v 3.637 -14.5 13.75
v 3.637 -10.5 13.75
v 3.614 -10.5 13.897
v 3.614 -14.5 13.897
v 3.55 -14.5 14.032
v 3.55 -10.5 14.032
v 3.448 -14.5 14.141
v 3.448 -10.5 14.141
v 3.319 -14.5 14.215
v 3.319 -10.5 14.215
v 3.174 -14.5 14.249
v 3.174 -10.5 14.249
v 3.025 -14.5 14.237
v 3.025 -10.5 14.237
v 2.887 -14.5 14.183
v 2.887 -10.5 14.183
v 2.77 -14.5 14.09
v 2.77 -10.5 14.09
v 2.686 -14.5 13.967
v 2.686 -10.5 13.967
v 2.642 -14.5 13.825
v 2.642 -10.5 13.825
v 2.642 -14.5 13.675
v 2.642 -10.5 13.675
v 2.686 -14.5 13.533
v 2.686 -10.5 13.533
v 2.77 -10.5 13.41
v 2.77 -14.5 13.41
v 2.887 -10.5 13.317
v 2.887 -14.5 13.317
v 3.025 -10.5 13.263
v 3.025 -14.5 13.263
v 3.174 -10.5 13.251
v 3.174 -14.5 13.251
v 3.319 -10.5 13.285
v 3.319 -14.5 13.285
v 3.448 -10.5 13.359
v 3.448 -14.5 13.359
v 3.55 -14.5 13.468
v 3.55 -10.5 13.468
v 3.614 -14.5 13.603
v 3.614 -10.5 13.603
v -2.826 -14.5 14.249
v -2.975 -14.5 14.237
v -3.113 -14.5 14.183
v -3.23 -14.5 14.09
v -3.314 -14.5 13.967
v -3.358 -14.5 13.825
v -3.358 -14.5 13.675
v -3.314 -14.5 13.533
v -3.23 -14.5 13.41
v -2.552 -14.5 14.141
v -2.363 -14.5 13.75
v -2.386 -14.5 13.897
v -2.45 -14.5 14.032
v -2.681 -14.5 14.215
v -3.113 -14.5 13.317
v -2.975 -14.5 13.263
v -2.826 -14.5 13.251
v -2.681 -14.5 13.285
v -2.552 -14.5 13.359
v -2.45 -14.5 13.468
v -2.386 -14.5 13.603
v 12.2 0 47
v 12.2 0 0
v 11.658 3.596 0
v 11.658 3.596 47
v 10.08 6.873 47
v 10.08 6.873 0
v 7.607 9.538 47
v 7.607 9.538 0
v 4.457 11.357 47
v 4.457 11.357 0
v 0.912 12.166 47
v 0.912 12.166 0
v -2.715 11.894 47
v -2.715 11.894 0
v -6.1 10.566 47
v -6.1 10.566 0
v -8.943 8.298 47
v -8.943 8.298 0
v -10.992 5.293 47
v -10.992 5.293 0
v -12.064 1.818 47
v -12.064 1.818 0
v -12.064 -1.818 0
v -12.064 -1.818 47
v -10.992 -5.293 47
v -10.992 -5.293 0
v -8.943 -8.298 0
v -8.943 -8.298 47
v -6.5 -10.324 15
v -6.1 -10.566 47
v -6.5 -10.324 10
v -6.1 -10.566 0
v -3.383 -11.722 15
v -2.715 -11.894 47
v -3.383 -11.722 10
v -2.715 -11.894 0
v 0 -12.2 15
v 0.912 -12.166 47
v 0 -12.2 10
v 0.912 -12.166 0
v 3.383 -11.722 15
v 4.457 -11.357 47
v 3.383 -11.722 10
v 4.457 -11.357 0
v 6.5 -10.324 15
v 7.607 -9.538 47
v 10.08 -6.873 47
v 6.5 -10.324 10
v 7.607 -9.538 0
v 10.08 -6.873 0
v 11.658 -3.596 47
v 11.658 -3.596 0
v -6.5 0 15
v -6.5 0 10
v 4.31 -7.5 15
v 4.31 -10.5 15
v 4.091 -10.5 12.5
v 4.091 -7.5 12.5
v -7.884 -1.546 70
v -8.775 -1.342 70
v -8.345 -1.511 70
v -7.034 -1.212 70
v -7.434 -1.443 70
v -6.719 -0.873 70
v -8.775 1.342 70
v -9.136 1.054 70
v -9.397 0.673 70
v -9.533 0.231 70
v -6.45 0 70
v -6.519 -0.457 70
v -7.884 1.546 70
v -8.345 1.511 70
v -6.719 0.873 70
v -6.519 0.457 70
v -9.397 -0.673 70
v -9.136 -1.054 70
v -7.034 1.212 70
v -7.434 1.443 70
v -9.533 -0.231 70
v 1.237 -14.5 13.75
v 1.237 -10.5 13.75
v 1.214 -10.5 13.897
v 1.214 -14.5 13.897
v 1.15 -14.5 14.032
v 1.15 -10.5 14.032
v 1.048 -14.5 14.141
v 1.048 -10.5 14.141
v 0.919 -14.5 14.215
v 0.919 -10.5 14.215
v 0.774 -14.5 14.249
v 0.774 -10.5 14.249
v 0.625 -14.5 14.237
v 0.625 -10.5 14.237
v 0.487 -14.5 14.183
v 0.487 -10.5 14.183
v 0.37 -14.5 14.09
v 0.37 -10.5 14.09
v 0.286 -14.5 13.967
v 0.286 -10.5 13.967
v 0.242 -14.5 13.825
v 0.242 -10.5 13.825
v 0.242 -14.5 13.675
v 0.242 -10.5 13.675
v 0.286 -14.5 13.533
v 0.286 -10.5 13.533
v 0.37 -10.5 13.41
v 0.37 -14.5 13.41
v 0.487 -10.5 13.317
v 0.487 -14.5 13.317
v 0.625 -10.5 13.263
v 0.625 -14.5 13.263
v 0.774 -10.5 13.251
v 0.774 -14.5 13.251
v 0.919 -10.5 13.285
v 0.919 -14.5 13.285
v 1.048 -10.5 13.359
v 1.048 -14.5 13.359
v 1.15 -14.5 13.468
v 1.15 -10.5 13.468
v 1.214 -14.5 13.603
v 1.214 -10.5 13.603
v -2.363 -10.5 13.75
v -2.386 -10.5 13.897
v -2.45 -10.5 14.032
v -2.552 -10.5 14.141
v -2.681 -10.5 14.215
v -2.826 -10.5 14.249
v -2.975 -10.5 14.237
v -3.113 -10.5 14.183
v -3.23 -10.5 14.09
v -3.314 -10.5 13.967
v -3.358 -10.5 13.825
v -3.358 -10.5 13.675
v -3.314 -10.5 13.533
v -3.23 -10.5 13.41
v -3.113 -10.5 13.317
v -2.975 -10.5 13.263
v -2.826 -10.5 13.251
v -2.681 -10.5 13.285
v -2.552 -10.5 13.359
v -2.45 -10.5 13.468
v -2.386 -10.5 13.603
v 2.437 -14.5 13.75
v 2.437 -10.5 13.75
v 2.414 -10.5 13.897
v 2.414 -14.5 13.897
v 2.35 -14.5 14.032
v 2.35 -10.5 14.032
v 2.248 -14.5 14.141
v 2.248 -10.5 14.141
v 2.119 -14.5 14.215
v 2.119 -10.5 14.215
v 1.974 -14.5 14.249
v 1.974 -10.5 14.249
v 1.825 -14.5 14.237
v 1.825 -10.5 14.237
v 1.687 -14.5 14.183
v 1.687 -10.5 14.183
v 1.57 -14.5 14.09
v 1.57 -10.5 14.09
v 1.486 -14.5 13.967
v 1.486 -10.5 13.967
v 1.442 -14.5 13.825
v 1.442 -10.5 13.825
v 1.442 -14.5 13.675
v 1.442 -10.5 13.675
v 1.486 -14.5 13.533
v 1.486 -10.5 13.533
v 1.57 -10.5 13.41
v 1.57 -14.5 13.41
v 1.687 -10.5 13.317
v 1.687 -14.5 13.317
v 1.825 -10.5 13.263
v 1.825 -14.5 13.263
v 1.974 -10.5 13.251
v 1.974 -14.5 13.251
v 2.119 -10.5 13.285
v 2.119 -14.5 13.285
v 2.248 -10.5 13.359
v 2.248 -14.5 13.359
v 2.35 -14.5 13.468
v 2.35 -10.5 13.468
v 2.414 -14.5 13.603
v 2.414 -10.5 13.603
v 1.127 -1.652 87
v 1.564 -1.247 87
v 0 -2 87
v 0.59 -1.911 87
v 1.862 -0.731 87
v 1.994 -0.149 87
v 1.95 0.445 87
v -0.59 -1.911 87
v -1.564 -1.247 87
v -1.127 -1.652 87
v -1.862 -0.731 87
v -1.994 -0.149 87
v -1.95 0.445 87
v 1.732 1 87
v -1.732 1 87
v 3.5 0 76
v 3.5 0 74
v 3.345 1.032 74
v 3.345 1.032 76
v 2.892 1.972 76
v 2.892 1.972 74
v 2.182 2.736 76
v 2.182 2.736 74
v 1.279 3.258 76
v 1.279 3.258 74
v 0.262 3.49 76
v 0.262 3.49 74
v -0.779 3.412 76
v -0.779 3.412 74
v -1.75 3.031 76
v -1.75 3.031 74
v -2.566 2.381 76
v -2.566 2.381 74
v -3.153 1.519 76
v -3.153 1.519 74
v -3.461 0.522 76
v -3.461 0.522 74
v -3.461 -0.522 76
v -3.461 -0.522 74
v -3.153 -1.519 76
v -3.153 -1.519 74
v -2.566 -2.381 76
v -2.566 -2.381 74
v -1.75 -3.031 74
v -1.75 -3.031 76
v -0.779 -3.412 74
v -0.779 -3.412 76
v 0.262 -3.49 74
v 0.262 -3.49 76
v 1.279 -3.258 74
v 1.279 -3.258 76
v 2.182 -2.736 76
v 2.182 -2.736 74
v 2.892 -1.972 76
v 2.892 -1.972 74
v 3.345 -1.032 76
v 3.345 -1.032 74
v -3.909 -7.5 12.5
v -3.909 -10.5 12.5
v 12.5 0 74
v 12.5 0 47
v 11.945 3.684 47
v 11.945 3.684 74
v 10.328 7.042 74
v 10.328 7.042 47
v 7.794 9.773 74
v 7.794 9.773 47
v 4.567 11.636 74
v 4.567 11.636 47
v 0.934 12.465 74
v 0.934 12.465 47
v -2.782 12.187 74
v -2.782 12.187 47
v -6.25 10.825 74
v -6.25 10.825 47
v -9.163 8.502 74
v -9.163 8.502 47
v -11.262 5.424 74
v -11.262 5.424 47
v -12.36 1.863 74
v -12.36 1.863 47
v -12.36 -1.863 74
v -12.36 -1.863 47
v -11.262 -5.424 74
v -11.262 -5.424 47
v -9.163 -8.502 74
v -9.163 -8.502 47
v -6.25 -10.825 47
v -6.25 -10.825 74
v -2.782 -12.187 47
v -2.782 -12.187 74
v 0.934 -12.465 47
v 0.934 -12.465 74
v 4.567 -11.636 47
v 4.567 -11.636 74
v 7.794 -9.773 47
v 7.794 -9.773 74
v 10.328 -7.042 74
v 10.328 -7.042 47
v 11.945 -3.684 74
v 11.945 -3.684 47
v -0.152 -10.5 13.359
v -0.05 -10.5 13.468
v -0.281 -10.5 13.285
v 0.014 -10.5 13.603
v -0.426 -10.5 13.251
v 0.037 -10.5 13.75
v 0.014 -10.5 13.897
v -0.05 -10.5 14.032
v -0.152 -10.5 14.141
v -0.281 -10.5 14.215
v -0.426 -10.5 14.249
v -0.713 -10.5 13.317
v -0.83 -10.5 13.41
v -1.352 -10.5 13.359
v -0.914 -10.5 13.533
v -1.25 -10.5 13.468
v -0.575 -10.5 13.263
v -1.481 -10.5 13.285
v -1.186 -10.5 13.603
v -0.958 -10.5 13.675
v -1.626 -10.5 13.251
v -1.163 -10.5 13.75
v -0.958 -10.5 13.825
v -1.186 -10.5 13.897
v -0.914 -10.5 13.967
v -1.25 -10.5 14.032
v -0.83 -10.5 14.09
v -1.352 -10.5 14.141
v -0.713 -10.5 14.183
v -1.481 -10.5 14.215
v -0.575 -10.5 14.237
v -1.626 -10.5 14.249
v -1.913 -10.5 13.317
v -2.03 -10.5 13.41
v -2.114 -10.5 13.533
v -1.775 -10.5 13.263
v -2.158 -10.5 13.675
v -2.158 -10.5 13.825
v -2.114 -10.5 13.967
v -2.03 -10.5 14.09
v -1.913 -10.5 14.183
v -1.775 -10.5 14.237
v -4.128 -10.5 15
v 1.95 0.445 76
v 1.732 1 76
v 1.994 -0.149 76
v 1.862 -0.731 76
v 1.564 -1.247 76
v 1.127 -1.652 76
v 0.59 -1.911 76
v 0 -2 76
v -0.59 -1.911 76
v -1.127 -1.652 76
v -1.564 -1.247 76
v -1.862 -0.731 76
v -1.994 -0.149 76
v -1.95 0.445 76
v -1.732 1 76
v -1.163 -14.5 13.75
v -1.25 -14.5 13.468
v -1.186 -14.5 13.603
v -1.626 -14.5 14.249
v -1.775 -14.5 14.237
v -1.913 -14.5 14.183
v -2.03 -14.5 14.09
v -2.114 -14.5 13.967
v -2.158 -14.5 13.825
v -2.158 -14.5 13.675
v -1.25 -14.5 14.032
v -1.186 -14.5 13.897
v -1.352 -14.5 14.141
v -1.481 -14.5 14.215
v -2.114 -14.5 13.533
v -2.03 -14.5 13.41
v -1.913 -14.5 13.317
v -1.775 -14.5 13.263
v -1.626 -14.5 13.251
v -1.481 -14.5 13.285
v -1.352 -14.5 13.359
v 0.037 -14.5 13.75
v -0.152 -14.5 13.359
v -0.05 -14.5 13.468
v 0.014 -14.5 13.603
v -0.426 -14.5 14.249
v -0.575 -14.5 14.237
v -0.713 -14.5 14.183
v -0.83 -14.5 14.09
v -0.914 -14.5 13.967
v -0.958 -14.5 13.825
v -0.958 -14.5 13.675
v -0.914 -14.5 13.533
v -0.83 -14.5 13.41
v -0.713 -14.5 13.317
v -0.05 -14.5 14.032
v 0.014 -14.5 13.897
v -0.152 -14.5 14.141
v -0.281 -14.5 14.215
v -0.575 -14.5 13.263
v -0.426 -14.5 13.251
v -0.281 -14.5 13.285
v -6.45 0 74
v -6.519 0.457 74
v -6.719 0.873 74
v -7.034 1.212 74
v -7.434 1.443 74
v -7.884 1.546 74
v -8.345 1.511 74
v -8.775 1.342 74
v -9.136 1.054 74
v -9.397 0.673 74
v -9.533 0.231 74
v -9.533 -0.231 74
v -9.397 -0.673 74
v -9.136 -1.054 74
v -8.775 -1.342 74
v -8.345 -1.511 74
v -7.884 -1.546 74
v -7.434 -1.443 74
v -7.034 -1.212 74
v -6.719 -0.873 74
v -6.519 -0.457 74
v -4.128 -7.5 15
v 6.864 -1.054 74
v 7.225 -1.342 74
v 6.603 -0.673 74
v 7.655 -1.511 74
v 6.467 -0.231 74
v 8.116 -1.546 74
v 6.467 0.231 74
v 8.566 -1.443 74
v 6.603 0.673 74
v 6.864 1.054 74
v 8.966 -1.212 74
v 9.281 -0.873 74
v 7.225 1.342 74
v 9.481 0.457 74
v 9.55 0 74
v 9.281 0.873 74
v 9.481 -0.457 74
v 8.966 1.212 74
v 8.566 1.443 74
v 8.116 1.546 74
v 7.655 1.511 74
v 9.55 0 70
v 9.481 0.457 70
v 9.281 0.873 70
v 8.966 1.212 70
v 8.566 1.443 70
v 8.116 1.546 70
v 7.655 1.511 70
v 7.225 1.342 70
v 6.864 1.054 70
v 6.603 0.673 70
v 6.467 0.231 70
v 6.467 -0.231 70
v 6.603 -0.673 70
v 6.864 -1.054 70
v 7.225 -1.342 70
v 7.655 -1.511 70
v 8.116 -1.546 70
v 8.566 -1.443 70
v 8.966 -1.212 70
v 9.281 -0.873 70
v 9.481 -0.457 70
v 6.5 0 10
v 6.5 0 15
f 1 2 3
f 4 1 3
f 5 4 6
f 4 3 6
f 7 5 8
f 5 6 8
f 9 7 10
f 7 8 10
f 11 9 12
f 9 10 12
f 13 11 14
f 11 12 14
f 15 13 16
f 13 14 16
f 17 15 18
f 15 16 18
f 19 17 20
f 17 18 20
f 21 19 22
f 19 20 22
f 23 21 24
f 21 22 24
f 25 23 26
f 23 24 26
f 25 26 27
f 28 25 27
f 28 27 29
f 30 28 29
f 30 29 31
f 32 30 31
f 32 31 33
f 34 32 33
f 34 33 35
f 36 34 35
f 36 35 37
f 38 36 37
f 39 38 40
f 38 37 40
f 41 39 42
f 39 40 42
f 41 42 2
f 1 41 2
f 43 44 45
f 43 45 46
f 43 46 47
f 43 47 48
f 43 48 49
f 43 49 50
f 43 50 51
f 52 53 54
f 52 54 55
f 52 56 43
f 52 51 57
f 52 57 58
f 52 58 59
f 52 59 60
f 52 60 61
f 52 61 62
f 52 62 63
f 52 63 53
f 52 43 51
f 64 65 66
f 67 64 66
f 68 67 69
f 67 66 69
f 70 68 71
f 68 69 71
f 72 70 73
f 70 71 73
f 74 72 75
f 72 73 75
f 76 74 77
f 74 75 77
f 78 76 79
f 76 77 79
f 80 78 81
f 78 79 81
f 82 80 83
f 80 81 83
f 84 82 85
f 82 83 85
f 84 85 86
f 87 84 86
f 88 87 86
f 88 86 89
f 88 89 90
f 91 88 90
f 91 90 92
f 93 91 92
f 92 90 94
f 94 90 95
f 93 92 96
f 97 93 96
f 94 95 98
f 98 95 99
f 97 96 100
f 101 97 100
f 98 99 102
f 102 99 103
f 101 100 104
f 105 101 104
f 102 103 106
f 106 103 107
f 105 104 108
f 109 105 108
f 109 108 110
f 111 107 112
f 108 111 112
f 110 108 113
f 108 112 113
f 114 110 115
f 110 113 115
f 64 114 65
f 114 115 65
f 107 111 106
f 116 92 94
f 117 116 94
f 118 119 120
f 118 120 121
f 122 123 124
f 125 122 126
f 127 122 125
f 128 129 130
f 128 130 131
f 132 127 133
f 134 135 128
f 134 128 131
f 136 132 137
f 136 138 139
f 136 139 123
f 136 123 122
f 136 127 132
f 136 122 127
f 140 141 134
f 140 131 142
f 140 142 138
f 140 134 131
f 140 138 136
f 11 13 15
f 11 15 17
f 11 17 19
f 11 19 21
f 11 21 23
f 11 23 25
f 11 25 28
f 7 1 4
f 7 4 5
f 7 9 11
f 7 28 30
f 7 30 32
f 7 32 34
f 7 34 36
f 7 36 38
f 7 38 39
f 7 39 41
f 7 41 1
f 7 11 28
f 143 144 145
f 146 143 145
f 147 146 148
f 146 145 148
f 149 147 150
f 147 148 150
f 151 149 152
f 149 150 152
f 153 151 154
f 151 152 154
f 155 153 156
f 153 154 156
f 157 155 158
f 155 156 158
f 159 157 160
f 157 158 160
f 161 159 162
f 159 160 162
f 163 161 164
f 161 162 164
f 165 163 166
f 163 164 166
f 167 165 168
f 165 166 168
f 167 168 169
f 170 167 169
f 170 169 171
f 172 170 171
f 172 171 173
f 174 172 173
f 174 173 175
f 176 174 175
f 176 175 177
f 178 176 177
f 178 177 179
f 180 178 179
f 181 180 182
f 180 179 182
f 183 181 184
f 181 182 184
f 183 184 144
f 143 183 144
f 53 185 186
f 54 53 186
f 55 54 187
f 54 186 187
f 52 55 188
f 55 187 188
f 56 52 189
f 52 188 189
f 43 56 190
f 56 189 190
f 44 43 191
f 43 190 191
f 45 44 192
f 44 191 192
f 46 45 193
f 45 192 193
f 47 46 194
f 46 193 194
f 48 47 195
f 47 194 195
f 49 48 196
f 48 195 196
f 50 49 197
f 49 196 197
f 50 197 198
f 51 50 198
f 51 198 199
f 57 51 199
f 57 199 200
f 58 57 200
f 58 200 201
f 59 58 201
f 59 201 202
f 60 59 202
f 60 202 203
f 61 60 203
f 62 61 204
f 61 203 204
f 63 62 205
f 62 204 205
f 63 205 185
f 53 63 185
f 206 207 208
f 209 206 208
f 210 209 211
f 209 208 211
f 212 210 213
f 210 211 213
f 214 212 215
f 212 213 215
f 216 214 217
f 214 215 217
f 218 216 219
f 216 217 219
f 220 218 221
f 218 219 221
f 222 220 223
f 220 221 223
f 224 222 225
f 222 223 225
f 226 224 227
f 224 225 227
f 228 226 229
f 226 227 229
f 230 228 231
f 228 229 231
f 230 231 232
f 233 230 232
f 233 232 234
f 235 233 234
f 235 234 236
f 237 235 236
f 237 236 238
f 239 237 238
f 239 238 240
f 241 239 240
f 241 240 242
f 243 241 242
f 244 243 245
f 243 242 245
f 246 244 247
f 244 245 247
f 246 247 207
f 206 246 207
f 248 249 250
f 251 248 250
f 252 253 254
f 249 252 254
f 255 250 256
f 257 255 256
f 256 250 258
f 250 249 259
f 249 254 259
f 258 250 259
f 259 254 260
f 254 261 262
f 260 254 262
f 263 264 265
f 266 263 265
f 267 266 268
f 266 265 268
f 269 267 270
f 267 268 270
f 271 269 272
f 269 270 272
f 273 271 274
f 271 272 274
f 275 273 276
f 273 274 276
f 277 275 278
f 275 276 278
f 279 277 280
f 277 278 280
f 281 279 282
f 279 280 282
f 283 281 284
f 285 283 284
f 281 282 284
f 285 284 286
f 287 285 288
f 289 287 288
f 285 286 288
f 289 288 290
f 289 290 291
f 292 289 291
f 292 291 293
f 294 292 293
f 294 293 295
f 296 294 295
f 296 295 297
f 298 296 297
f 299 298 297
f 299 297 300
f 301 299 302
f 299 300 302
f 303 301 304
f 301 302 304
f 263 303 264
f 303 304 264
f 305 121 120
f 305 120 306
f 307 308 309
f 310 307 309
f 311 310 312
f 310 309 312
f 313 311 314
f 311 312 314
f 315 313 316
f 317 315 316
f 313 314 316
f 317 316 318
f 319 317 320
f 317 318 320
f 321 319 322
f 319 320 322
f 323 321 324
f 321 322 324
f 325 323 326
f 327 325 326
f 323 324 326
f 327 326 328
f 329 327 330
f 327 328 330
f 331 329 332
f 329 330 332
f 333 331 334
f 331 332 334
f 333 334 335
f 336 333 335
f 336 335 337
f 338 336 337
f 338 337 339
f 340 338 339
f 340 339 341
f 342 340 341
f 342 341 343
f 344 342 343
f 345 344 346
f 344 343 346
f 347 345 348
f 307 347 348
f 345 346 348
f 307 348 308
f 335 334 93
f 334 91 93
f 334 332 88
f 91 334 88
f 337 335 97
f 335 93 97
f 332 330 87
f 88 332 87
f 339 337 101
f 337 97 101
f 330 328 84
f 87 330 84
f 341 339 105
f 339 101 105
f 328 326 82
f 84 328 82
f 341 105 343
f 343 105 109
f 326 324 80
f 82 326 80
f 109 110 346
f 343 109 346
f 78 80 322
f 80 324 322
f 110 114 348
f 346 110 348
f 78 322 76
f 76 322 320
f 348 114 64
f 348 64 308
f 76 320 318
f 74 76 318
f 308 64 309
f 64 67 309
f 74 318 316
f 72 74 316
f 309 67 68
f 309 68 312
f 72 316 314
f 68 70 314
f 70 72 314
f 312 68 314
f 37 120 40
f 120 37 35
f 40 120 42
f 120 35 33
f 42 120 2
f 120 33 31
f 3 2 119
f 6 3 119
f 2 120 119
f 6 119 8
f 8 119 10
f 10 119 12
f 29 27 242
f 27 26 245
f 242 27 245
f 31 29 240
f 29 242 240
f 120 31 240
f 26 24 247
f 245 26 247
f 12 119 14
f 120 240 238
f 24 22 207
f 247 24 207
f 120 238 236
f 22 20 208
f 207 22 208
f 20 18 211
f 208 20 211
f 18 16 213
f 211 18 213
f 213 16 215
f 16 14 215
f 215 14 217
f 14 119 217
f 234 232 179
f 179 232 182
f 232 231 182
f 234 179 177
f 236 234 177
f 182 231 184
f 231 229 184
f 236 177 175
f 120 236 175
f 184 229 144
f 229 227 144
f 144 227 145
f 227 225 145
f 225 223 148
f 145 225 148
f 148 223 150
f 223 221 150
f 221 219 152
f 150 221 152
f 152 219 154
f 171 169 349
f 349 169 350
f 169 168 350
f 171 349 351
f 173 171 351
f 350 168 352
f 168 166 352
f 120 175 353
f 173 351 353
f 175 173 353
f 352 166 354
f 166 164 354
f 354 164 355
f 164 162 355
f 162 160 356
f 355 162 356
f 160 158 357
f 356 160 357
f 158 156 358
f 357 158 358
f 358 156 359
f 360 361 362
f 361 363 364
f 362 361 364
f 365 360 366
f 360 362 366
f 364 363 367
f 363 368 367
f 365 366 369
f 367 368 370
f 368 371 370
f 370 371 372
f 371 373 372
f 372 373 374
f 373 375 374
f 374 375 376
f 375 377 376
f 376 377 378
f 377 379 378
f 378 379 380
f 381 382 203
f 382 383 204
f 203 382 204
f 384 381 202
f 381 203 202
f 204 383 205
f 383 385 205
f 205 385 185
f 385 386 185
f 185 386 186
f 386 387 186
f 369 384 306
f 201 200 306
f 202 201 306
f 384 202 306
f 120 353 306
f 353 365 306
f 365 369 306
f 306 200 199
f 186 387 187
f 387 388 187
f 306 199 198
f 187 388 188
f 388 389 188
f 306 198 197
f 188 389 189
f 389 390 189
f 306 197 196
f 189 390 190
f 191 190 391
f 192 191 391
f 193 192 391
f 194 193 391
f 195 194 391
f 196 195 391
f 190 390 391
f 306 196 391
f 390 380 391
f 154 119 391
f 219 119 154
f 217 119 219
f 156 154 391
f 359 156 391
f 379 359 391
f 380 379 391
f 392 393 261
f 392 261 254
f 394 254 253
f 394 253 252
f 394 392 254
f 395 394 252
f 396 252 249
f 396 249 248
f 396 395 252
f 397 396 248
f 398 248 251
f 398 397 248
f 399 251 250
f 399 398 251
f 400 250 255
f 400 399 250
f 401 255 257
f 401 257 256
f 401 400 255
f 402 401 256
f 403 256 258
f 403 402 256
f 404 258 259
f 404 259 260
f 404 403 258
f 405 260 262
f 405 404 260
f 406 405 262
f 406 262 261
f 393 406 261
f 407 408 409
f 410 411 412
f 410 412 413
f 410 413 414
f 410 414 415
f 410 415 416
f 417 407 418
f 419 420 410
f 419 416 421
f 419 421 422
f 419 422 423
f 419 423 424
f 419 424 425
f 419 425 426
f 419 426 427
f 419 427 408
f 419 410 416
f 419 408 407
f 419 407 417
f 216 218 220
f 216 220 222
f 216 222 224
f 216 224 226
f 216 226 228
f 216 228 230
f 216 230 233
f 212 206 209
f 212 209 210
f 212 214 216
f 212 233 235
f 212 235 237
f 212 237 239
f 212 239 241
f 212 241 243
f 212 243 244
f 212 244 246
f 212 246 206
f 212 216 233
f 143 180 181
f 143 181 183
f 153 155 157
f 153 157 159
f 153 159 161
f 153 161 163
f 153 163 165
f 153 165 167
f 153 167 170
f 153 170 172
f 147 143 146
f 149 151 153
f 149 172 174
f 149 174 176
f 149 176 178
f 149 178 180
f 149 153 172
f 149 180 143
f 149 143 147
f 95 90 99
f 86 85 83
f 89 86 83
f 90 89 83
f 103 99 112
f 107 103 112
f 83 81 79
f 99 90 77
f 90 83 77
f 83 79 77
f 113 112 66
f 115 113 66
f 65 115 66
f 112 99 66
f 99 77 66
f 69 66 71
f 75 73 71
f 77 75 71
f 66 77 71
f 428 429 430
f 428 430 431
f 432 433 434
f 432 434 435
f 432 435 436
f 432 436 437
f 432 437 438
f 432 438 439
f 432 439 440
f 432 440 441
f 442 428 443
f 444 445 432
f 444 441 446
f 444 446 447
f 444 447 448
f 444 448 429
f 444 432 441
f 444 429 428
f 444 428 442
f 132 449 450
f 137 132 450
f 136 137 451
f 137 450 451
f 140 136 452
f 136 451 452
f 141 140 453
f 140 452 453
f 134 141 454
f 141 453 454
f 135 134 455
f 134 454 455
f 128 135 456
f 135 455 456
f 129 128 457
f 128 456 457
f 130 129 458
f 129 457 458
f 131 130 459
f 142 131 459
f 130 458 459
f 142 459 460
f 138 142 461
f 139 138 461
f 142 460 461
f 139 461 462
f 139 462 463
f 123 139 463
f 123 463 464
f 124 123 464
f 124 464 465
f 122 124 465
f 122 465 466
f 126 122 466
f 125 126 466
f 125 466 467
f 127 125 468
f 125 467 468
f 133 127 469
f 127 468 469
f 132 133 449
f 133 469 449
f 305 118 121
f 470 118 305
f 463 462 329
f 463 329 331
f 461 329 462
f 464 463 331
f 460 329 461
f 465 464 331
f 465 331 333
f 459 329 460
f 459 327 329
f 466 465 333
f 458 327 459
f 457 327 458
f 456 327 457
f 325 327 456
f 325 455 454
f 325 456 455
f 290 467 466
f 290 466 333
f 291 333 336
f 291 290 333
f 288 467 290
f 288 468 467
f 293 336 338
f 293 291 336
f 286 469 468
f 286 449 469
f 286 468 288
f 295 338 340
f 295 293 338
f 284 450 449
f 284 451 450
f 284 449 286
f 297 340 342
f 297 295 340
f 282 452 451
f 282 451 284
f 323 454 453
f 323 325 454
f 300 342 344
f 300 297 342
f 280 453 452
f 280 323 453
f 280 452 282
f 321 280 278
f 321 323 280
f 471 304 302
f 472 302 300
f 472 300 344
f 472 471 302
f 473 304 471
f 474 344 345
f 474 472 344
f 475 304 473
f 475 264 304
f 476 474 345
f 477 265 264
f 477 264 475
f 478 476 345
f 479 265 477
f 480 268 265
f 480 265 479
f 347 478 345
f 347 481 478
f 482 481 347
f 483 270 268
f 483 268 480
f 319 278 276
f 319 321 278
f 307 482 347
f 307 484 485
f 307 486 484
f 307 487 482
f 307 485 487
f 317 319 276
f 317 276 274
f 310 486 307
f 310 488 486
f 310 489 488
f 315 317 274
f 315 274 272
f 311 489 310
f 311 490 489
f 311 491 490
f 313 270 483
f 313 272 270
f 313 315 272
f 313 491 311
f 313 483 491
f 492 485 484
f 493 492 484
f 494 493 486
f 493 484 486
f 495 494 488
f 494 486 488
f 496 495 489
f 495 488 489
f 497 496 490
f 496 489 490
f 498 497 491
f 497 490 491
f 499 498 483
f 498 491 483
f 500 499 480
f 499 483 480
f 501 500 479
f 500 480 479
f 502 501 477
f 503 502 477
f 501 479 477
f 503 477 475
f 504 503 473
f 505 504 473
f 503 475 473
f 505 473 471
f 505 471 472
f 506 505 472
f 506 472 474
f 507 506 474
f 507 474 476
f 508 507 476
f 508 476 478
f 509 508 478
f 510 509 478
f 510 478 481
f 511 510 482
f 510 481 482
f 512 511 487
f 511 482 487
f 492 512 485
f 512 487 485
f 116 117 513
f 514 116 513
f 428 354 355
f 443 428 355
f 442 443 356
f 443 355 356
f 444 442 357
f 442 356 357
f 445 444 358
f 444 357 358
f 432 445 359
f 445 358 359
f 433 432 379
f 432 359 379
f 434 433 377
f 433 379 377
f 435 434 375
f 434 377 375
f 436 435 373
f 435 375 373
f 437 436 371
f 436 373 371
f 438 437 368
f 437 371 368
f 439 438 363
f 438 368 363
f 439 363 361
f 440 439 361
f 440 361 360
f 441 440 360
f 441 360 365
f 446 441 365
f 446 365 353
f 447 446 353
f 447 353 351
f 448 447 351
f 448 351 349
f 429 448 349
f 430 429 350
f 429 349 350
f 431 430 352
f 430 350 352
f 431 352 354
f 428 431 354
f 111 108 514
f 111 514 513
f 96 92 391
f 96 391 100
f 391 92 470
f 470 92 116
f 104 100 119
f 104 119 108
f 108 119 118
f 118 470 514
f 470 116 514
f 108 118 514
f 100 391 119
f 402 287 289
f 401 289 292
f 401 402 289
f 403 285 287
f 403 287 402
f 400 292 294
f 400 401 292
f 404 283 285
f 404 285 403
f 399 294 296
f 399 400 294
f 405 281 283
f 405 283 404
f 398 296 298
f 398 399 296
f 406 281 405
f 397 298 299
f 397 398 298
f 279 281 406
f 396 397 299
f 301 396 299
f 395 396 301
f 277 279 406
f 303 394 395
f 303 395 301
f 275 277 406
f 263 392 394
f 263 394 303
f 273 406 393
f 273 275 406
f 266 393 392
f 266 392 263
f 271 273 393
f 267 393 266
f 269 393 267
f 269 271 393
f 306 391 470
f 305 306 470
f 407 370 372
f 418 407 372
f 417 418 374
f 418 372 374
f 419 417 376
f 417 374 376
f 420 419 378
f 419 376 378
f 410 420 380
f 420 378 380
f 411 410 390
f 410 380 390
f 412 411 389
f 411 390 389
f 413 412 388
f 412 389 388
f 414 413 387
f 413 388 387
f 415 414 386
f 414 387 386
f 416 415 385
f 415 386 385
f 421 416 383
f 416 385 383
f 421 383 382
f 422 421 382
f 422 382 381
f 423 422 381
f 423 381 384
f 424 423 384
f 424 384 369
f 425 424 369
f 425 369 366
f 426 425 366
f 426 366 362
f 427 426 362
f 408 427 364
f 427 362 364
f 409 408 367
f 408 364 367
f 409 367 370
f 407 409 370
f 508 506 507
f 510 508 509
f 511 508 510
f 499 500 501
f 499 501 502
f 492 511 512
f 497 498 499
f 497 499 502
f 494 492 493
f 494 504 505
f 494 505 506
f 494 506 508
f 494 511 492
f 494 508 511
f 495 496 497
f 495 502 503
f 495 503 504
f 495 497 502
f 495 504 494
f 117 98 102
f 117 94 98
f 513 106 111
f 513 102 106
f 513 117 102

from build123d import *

# Parameters (mm, degrees)
SKETCH1_R           = 12.2
BOSS_EXTRUDE1_DEPTH = 47
SKETCH2_R           = 12.5
BOSS_EXTRUDE2_DEPTH = 27
SKETCH3_R           = 3.5
BOSS_EXTRUDE3_DEPTH = 2
BOSS_EXTRUDE4_DEPTH = 11
SKETCH6_W           = 13
SKETCH6_H           = 5
CUT_EXTRUDE1_DEPTH  = 15
SKETCH7_W           = 8
SKETCH7_H           = 3
BOSS_EXTRUDE6_DEPTH = 2.5
SKETCH8_R           = 0.5
BOSS_EXTRUDE7_DEPTH = 4
DRAFT1_ANGLE        = 5
SKETCH9_R           = 1.55
CUT_EXTRUDE2_DEPTH  = 4


with BuildPart() as part:
    # Sketch1 → Boss-Extrude1 (new body)
    with BuildSketch(Plane.XY):
        Circle(SKETCH1_R)
    extrude(amount=BOSS_EXTRUDE1_DEPTH)

    # Sketch2 → Boss-Extrude2 (add)
    with BuildSketch(Plane.XY.offset(47)):
        Circle(SKETCH2_R)
    extrude(amount=BOSS_EXTRUDE2_DEPTH)

    # Sketch3 → Boss-Extrude3 (add)
    with BuildSketch(Plane.XY.offset(74)):
        Circle(SKETCH3_R)
    extrude(amount=BOSS_EXTRUDE3_DEPTH)

    # Sketch4 → Boss-Extrude4 (add)
    with BuildSketch(Plane.XY.offset(76)):
        with BuildLine():
            Line((-1.732050808, 1), (1.732050808, 1))
            ThreePointArc((1.732050808, 1), (0, -2), (-1.732050808, 1))
        make_face()
    extrude(amount=BOSS_EXTRUDE4_DEPTH)

    # Sketch6 → Cut-Extrude1 (cut)
    with BuildSketch(Plane(origin=(0, 0, 0), x_dir=(1, 0, 0), z_dir=(0, 1, 0))):
        with Locations((0, -12.5)):
            Rectangle(SKETCH6_W, SKETCH6_H)
    extrude(amount=-CUT_EXTRUDE1_DEPTH, mode=Mode.SUBTRACT)

    # Sketch7 → Boss-Extrude6 (add)
    with BuildSketch(Plane(origin=(0, 0, 15), x_dir=(-1, 0, 0), z_dir=(0, 0, -1))):
        with Locations((-0.091140641, -9)):
            Rectangle(SKETCH7_W, SKETCH7_H)
    extrude(amount=BOSS_EXTRUDE6_DEPTH)

    # Sketch8 → Boss-Extrude7 (add)
    with BuildSketch(Plane.XZ.offset(10.5)):
        with Locations((-2.863289538, 13.75)):
            Circle(SKETCH8_R)
        with Locations((-1.663289538, 13.75)):
            Circle(SKETCH8_R)
        with Locations((-0.463289538, 13.75)):
            Circle(SKETCH8_R)
        with Locations((0.736710462, 13.75)):
            Circle(SKETCH8_R)
        with Locations((1.936710462, 13.75)):
            Circle(SKETCH8_R)
        with Locations((3.136710462, 13.75)):
            Circle(SKETCH8_R)
    extrude(amount=BOSS_EXTRUDE7_DEPTH)

    # Draft1
    draft1_faces = [part.faces().sort_by_distance(p)[0] for p in [
        (4.091140641, -9, 13.75),
        (-3.908859359, -9, 13.75),
    ]]
    draft(draft1_faces, Plane(origin=(0, 0, 12.5), x_dir=(-1, 0, 0), z_dir=(0, 0, -1)), DRAFT1_ANGLE)

    # Sketch9 → Cut-Extrude2 (cut)
    with BuildSketch(Plane.XY.offset(74)):
        with Locations((-8, 0)):
            Circle(SKETCH9_R)
        with Locations((8, 0)):
            Circle(SKETCH9_R)
    extrude(amount=-CUT_EXTRUDE2_DEPTH, mode=Mode.SUBTRACT)


solid = part.part
